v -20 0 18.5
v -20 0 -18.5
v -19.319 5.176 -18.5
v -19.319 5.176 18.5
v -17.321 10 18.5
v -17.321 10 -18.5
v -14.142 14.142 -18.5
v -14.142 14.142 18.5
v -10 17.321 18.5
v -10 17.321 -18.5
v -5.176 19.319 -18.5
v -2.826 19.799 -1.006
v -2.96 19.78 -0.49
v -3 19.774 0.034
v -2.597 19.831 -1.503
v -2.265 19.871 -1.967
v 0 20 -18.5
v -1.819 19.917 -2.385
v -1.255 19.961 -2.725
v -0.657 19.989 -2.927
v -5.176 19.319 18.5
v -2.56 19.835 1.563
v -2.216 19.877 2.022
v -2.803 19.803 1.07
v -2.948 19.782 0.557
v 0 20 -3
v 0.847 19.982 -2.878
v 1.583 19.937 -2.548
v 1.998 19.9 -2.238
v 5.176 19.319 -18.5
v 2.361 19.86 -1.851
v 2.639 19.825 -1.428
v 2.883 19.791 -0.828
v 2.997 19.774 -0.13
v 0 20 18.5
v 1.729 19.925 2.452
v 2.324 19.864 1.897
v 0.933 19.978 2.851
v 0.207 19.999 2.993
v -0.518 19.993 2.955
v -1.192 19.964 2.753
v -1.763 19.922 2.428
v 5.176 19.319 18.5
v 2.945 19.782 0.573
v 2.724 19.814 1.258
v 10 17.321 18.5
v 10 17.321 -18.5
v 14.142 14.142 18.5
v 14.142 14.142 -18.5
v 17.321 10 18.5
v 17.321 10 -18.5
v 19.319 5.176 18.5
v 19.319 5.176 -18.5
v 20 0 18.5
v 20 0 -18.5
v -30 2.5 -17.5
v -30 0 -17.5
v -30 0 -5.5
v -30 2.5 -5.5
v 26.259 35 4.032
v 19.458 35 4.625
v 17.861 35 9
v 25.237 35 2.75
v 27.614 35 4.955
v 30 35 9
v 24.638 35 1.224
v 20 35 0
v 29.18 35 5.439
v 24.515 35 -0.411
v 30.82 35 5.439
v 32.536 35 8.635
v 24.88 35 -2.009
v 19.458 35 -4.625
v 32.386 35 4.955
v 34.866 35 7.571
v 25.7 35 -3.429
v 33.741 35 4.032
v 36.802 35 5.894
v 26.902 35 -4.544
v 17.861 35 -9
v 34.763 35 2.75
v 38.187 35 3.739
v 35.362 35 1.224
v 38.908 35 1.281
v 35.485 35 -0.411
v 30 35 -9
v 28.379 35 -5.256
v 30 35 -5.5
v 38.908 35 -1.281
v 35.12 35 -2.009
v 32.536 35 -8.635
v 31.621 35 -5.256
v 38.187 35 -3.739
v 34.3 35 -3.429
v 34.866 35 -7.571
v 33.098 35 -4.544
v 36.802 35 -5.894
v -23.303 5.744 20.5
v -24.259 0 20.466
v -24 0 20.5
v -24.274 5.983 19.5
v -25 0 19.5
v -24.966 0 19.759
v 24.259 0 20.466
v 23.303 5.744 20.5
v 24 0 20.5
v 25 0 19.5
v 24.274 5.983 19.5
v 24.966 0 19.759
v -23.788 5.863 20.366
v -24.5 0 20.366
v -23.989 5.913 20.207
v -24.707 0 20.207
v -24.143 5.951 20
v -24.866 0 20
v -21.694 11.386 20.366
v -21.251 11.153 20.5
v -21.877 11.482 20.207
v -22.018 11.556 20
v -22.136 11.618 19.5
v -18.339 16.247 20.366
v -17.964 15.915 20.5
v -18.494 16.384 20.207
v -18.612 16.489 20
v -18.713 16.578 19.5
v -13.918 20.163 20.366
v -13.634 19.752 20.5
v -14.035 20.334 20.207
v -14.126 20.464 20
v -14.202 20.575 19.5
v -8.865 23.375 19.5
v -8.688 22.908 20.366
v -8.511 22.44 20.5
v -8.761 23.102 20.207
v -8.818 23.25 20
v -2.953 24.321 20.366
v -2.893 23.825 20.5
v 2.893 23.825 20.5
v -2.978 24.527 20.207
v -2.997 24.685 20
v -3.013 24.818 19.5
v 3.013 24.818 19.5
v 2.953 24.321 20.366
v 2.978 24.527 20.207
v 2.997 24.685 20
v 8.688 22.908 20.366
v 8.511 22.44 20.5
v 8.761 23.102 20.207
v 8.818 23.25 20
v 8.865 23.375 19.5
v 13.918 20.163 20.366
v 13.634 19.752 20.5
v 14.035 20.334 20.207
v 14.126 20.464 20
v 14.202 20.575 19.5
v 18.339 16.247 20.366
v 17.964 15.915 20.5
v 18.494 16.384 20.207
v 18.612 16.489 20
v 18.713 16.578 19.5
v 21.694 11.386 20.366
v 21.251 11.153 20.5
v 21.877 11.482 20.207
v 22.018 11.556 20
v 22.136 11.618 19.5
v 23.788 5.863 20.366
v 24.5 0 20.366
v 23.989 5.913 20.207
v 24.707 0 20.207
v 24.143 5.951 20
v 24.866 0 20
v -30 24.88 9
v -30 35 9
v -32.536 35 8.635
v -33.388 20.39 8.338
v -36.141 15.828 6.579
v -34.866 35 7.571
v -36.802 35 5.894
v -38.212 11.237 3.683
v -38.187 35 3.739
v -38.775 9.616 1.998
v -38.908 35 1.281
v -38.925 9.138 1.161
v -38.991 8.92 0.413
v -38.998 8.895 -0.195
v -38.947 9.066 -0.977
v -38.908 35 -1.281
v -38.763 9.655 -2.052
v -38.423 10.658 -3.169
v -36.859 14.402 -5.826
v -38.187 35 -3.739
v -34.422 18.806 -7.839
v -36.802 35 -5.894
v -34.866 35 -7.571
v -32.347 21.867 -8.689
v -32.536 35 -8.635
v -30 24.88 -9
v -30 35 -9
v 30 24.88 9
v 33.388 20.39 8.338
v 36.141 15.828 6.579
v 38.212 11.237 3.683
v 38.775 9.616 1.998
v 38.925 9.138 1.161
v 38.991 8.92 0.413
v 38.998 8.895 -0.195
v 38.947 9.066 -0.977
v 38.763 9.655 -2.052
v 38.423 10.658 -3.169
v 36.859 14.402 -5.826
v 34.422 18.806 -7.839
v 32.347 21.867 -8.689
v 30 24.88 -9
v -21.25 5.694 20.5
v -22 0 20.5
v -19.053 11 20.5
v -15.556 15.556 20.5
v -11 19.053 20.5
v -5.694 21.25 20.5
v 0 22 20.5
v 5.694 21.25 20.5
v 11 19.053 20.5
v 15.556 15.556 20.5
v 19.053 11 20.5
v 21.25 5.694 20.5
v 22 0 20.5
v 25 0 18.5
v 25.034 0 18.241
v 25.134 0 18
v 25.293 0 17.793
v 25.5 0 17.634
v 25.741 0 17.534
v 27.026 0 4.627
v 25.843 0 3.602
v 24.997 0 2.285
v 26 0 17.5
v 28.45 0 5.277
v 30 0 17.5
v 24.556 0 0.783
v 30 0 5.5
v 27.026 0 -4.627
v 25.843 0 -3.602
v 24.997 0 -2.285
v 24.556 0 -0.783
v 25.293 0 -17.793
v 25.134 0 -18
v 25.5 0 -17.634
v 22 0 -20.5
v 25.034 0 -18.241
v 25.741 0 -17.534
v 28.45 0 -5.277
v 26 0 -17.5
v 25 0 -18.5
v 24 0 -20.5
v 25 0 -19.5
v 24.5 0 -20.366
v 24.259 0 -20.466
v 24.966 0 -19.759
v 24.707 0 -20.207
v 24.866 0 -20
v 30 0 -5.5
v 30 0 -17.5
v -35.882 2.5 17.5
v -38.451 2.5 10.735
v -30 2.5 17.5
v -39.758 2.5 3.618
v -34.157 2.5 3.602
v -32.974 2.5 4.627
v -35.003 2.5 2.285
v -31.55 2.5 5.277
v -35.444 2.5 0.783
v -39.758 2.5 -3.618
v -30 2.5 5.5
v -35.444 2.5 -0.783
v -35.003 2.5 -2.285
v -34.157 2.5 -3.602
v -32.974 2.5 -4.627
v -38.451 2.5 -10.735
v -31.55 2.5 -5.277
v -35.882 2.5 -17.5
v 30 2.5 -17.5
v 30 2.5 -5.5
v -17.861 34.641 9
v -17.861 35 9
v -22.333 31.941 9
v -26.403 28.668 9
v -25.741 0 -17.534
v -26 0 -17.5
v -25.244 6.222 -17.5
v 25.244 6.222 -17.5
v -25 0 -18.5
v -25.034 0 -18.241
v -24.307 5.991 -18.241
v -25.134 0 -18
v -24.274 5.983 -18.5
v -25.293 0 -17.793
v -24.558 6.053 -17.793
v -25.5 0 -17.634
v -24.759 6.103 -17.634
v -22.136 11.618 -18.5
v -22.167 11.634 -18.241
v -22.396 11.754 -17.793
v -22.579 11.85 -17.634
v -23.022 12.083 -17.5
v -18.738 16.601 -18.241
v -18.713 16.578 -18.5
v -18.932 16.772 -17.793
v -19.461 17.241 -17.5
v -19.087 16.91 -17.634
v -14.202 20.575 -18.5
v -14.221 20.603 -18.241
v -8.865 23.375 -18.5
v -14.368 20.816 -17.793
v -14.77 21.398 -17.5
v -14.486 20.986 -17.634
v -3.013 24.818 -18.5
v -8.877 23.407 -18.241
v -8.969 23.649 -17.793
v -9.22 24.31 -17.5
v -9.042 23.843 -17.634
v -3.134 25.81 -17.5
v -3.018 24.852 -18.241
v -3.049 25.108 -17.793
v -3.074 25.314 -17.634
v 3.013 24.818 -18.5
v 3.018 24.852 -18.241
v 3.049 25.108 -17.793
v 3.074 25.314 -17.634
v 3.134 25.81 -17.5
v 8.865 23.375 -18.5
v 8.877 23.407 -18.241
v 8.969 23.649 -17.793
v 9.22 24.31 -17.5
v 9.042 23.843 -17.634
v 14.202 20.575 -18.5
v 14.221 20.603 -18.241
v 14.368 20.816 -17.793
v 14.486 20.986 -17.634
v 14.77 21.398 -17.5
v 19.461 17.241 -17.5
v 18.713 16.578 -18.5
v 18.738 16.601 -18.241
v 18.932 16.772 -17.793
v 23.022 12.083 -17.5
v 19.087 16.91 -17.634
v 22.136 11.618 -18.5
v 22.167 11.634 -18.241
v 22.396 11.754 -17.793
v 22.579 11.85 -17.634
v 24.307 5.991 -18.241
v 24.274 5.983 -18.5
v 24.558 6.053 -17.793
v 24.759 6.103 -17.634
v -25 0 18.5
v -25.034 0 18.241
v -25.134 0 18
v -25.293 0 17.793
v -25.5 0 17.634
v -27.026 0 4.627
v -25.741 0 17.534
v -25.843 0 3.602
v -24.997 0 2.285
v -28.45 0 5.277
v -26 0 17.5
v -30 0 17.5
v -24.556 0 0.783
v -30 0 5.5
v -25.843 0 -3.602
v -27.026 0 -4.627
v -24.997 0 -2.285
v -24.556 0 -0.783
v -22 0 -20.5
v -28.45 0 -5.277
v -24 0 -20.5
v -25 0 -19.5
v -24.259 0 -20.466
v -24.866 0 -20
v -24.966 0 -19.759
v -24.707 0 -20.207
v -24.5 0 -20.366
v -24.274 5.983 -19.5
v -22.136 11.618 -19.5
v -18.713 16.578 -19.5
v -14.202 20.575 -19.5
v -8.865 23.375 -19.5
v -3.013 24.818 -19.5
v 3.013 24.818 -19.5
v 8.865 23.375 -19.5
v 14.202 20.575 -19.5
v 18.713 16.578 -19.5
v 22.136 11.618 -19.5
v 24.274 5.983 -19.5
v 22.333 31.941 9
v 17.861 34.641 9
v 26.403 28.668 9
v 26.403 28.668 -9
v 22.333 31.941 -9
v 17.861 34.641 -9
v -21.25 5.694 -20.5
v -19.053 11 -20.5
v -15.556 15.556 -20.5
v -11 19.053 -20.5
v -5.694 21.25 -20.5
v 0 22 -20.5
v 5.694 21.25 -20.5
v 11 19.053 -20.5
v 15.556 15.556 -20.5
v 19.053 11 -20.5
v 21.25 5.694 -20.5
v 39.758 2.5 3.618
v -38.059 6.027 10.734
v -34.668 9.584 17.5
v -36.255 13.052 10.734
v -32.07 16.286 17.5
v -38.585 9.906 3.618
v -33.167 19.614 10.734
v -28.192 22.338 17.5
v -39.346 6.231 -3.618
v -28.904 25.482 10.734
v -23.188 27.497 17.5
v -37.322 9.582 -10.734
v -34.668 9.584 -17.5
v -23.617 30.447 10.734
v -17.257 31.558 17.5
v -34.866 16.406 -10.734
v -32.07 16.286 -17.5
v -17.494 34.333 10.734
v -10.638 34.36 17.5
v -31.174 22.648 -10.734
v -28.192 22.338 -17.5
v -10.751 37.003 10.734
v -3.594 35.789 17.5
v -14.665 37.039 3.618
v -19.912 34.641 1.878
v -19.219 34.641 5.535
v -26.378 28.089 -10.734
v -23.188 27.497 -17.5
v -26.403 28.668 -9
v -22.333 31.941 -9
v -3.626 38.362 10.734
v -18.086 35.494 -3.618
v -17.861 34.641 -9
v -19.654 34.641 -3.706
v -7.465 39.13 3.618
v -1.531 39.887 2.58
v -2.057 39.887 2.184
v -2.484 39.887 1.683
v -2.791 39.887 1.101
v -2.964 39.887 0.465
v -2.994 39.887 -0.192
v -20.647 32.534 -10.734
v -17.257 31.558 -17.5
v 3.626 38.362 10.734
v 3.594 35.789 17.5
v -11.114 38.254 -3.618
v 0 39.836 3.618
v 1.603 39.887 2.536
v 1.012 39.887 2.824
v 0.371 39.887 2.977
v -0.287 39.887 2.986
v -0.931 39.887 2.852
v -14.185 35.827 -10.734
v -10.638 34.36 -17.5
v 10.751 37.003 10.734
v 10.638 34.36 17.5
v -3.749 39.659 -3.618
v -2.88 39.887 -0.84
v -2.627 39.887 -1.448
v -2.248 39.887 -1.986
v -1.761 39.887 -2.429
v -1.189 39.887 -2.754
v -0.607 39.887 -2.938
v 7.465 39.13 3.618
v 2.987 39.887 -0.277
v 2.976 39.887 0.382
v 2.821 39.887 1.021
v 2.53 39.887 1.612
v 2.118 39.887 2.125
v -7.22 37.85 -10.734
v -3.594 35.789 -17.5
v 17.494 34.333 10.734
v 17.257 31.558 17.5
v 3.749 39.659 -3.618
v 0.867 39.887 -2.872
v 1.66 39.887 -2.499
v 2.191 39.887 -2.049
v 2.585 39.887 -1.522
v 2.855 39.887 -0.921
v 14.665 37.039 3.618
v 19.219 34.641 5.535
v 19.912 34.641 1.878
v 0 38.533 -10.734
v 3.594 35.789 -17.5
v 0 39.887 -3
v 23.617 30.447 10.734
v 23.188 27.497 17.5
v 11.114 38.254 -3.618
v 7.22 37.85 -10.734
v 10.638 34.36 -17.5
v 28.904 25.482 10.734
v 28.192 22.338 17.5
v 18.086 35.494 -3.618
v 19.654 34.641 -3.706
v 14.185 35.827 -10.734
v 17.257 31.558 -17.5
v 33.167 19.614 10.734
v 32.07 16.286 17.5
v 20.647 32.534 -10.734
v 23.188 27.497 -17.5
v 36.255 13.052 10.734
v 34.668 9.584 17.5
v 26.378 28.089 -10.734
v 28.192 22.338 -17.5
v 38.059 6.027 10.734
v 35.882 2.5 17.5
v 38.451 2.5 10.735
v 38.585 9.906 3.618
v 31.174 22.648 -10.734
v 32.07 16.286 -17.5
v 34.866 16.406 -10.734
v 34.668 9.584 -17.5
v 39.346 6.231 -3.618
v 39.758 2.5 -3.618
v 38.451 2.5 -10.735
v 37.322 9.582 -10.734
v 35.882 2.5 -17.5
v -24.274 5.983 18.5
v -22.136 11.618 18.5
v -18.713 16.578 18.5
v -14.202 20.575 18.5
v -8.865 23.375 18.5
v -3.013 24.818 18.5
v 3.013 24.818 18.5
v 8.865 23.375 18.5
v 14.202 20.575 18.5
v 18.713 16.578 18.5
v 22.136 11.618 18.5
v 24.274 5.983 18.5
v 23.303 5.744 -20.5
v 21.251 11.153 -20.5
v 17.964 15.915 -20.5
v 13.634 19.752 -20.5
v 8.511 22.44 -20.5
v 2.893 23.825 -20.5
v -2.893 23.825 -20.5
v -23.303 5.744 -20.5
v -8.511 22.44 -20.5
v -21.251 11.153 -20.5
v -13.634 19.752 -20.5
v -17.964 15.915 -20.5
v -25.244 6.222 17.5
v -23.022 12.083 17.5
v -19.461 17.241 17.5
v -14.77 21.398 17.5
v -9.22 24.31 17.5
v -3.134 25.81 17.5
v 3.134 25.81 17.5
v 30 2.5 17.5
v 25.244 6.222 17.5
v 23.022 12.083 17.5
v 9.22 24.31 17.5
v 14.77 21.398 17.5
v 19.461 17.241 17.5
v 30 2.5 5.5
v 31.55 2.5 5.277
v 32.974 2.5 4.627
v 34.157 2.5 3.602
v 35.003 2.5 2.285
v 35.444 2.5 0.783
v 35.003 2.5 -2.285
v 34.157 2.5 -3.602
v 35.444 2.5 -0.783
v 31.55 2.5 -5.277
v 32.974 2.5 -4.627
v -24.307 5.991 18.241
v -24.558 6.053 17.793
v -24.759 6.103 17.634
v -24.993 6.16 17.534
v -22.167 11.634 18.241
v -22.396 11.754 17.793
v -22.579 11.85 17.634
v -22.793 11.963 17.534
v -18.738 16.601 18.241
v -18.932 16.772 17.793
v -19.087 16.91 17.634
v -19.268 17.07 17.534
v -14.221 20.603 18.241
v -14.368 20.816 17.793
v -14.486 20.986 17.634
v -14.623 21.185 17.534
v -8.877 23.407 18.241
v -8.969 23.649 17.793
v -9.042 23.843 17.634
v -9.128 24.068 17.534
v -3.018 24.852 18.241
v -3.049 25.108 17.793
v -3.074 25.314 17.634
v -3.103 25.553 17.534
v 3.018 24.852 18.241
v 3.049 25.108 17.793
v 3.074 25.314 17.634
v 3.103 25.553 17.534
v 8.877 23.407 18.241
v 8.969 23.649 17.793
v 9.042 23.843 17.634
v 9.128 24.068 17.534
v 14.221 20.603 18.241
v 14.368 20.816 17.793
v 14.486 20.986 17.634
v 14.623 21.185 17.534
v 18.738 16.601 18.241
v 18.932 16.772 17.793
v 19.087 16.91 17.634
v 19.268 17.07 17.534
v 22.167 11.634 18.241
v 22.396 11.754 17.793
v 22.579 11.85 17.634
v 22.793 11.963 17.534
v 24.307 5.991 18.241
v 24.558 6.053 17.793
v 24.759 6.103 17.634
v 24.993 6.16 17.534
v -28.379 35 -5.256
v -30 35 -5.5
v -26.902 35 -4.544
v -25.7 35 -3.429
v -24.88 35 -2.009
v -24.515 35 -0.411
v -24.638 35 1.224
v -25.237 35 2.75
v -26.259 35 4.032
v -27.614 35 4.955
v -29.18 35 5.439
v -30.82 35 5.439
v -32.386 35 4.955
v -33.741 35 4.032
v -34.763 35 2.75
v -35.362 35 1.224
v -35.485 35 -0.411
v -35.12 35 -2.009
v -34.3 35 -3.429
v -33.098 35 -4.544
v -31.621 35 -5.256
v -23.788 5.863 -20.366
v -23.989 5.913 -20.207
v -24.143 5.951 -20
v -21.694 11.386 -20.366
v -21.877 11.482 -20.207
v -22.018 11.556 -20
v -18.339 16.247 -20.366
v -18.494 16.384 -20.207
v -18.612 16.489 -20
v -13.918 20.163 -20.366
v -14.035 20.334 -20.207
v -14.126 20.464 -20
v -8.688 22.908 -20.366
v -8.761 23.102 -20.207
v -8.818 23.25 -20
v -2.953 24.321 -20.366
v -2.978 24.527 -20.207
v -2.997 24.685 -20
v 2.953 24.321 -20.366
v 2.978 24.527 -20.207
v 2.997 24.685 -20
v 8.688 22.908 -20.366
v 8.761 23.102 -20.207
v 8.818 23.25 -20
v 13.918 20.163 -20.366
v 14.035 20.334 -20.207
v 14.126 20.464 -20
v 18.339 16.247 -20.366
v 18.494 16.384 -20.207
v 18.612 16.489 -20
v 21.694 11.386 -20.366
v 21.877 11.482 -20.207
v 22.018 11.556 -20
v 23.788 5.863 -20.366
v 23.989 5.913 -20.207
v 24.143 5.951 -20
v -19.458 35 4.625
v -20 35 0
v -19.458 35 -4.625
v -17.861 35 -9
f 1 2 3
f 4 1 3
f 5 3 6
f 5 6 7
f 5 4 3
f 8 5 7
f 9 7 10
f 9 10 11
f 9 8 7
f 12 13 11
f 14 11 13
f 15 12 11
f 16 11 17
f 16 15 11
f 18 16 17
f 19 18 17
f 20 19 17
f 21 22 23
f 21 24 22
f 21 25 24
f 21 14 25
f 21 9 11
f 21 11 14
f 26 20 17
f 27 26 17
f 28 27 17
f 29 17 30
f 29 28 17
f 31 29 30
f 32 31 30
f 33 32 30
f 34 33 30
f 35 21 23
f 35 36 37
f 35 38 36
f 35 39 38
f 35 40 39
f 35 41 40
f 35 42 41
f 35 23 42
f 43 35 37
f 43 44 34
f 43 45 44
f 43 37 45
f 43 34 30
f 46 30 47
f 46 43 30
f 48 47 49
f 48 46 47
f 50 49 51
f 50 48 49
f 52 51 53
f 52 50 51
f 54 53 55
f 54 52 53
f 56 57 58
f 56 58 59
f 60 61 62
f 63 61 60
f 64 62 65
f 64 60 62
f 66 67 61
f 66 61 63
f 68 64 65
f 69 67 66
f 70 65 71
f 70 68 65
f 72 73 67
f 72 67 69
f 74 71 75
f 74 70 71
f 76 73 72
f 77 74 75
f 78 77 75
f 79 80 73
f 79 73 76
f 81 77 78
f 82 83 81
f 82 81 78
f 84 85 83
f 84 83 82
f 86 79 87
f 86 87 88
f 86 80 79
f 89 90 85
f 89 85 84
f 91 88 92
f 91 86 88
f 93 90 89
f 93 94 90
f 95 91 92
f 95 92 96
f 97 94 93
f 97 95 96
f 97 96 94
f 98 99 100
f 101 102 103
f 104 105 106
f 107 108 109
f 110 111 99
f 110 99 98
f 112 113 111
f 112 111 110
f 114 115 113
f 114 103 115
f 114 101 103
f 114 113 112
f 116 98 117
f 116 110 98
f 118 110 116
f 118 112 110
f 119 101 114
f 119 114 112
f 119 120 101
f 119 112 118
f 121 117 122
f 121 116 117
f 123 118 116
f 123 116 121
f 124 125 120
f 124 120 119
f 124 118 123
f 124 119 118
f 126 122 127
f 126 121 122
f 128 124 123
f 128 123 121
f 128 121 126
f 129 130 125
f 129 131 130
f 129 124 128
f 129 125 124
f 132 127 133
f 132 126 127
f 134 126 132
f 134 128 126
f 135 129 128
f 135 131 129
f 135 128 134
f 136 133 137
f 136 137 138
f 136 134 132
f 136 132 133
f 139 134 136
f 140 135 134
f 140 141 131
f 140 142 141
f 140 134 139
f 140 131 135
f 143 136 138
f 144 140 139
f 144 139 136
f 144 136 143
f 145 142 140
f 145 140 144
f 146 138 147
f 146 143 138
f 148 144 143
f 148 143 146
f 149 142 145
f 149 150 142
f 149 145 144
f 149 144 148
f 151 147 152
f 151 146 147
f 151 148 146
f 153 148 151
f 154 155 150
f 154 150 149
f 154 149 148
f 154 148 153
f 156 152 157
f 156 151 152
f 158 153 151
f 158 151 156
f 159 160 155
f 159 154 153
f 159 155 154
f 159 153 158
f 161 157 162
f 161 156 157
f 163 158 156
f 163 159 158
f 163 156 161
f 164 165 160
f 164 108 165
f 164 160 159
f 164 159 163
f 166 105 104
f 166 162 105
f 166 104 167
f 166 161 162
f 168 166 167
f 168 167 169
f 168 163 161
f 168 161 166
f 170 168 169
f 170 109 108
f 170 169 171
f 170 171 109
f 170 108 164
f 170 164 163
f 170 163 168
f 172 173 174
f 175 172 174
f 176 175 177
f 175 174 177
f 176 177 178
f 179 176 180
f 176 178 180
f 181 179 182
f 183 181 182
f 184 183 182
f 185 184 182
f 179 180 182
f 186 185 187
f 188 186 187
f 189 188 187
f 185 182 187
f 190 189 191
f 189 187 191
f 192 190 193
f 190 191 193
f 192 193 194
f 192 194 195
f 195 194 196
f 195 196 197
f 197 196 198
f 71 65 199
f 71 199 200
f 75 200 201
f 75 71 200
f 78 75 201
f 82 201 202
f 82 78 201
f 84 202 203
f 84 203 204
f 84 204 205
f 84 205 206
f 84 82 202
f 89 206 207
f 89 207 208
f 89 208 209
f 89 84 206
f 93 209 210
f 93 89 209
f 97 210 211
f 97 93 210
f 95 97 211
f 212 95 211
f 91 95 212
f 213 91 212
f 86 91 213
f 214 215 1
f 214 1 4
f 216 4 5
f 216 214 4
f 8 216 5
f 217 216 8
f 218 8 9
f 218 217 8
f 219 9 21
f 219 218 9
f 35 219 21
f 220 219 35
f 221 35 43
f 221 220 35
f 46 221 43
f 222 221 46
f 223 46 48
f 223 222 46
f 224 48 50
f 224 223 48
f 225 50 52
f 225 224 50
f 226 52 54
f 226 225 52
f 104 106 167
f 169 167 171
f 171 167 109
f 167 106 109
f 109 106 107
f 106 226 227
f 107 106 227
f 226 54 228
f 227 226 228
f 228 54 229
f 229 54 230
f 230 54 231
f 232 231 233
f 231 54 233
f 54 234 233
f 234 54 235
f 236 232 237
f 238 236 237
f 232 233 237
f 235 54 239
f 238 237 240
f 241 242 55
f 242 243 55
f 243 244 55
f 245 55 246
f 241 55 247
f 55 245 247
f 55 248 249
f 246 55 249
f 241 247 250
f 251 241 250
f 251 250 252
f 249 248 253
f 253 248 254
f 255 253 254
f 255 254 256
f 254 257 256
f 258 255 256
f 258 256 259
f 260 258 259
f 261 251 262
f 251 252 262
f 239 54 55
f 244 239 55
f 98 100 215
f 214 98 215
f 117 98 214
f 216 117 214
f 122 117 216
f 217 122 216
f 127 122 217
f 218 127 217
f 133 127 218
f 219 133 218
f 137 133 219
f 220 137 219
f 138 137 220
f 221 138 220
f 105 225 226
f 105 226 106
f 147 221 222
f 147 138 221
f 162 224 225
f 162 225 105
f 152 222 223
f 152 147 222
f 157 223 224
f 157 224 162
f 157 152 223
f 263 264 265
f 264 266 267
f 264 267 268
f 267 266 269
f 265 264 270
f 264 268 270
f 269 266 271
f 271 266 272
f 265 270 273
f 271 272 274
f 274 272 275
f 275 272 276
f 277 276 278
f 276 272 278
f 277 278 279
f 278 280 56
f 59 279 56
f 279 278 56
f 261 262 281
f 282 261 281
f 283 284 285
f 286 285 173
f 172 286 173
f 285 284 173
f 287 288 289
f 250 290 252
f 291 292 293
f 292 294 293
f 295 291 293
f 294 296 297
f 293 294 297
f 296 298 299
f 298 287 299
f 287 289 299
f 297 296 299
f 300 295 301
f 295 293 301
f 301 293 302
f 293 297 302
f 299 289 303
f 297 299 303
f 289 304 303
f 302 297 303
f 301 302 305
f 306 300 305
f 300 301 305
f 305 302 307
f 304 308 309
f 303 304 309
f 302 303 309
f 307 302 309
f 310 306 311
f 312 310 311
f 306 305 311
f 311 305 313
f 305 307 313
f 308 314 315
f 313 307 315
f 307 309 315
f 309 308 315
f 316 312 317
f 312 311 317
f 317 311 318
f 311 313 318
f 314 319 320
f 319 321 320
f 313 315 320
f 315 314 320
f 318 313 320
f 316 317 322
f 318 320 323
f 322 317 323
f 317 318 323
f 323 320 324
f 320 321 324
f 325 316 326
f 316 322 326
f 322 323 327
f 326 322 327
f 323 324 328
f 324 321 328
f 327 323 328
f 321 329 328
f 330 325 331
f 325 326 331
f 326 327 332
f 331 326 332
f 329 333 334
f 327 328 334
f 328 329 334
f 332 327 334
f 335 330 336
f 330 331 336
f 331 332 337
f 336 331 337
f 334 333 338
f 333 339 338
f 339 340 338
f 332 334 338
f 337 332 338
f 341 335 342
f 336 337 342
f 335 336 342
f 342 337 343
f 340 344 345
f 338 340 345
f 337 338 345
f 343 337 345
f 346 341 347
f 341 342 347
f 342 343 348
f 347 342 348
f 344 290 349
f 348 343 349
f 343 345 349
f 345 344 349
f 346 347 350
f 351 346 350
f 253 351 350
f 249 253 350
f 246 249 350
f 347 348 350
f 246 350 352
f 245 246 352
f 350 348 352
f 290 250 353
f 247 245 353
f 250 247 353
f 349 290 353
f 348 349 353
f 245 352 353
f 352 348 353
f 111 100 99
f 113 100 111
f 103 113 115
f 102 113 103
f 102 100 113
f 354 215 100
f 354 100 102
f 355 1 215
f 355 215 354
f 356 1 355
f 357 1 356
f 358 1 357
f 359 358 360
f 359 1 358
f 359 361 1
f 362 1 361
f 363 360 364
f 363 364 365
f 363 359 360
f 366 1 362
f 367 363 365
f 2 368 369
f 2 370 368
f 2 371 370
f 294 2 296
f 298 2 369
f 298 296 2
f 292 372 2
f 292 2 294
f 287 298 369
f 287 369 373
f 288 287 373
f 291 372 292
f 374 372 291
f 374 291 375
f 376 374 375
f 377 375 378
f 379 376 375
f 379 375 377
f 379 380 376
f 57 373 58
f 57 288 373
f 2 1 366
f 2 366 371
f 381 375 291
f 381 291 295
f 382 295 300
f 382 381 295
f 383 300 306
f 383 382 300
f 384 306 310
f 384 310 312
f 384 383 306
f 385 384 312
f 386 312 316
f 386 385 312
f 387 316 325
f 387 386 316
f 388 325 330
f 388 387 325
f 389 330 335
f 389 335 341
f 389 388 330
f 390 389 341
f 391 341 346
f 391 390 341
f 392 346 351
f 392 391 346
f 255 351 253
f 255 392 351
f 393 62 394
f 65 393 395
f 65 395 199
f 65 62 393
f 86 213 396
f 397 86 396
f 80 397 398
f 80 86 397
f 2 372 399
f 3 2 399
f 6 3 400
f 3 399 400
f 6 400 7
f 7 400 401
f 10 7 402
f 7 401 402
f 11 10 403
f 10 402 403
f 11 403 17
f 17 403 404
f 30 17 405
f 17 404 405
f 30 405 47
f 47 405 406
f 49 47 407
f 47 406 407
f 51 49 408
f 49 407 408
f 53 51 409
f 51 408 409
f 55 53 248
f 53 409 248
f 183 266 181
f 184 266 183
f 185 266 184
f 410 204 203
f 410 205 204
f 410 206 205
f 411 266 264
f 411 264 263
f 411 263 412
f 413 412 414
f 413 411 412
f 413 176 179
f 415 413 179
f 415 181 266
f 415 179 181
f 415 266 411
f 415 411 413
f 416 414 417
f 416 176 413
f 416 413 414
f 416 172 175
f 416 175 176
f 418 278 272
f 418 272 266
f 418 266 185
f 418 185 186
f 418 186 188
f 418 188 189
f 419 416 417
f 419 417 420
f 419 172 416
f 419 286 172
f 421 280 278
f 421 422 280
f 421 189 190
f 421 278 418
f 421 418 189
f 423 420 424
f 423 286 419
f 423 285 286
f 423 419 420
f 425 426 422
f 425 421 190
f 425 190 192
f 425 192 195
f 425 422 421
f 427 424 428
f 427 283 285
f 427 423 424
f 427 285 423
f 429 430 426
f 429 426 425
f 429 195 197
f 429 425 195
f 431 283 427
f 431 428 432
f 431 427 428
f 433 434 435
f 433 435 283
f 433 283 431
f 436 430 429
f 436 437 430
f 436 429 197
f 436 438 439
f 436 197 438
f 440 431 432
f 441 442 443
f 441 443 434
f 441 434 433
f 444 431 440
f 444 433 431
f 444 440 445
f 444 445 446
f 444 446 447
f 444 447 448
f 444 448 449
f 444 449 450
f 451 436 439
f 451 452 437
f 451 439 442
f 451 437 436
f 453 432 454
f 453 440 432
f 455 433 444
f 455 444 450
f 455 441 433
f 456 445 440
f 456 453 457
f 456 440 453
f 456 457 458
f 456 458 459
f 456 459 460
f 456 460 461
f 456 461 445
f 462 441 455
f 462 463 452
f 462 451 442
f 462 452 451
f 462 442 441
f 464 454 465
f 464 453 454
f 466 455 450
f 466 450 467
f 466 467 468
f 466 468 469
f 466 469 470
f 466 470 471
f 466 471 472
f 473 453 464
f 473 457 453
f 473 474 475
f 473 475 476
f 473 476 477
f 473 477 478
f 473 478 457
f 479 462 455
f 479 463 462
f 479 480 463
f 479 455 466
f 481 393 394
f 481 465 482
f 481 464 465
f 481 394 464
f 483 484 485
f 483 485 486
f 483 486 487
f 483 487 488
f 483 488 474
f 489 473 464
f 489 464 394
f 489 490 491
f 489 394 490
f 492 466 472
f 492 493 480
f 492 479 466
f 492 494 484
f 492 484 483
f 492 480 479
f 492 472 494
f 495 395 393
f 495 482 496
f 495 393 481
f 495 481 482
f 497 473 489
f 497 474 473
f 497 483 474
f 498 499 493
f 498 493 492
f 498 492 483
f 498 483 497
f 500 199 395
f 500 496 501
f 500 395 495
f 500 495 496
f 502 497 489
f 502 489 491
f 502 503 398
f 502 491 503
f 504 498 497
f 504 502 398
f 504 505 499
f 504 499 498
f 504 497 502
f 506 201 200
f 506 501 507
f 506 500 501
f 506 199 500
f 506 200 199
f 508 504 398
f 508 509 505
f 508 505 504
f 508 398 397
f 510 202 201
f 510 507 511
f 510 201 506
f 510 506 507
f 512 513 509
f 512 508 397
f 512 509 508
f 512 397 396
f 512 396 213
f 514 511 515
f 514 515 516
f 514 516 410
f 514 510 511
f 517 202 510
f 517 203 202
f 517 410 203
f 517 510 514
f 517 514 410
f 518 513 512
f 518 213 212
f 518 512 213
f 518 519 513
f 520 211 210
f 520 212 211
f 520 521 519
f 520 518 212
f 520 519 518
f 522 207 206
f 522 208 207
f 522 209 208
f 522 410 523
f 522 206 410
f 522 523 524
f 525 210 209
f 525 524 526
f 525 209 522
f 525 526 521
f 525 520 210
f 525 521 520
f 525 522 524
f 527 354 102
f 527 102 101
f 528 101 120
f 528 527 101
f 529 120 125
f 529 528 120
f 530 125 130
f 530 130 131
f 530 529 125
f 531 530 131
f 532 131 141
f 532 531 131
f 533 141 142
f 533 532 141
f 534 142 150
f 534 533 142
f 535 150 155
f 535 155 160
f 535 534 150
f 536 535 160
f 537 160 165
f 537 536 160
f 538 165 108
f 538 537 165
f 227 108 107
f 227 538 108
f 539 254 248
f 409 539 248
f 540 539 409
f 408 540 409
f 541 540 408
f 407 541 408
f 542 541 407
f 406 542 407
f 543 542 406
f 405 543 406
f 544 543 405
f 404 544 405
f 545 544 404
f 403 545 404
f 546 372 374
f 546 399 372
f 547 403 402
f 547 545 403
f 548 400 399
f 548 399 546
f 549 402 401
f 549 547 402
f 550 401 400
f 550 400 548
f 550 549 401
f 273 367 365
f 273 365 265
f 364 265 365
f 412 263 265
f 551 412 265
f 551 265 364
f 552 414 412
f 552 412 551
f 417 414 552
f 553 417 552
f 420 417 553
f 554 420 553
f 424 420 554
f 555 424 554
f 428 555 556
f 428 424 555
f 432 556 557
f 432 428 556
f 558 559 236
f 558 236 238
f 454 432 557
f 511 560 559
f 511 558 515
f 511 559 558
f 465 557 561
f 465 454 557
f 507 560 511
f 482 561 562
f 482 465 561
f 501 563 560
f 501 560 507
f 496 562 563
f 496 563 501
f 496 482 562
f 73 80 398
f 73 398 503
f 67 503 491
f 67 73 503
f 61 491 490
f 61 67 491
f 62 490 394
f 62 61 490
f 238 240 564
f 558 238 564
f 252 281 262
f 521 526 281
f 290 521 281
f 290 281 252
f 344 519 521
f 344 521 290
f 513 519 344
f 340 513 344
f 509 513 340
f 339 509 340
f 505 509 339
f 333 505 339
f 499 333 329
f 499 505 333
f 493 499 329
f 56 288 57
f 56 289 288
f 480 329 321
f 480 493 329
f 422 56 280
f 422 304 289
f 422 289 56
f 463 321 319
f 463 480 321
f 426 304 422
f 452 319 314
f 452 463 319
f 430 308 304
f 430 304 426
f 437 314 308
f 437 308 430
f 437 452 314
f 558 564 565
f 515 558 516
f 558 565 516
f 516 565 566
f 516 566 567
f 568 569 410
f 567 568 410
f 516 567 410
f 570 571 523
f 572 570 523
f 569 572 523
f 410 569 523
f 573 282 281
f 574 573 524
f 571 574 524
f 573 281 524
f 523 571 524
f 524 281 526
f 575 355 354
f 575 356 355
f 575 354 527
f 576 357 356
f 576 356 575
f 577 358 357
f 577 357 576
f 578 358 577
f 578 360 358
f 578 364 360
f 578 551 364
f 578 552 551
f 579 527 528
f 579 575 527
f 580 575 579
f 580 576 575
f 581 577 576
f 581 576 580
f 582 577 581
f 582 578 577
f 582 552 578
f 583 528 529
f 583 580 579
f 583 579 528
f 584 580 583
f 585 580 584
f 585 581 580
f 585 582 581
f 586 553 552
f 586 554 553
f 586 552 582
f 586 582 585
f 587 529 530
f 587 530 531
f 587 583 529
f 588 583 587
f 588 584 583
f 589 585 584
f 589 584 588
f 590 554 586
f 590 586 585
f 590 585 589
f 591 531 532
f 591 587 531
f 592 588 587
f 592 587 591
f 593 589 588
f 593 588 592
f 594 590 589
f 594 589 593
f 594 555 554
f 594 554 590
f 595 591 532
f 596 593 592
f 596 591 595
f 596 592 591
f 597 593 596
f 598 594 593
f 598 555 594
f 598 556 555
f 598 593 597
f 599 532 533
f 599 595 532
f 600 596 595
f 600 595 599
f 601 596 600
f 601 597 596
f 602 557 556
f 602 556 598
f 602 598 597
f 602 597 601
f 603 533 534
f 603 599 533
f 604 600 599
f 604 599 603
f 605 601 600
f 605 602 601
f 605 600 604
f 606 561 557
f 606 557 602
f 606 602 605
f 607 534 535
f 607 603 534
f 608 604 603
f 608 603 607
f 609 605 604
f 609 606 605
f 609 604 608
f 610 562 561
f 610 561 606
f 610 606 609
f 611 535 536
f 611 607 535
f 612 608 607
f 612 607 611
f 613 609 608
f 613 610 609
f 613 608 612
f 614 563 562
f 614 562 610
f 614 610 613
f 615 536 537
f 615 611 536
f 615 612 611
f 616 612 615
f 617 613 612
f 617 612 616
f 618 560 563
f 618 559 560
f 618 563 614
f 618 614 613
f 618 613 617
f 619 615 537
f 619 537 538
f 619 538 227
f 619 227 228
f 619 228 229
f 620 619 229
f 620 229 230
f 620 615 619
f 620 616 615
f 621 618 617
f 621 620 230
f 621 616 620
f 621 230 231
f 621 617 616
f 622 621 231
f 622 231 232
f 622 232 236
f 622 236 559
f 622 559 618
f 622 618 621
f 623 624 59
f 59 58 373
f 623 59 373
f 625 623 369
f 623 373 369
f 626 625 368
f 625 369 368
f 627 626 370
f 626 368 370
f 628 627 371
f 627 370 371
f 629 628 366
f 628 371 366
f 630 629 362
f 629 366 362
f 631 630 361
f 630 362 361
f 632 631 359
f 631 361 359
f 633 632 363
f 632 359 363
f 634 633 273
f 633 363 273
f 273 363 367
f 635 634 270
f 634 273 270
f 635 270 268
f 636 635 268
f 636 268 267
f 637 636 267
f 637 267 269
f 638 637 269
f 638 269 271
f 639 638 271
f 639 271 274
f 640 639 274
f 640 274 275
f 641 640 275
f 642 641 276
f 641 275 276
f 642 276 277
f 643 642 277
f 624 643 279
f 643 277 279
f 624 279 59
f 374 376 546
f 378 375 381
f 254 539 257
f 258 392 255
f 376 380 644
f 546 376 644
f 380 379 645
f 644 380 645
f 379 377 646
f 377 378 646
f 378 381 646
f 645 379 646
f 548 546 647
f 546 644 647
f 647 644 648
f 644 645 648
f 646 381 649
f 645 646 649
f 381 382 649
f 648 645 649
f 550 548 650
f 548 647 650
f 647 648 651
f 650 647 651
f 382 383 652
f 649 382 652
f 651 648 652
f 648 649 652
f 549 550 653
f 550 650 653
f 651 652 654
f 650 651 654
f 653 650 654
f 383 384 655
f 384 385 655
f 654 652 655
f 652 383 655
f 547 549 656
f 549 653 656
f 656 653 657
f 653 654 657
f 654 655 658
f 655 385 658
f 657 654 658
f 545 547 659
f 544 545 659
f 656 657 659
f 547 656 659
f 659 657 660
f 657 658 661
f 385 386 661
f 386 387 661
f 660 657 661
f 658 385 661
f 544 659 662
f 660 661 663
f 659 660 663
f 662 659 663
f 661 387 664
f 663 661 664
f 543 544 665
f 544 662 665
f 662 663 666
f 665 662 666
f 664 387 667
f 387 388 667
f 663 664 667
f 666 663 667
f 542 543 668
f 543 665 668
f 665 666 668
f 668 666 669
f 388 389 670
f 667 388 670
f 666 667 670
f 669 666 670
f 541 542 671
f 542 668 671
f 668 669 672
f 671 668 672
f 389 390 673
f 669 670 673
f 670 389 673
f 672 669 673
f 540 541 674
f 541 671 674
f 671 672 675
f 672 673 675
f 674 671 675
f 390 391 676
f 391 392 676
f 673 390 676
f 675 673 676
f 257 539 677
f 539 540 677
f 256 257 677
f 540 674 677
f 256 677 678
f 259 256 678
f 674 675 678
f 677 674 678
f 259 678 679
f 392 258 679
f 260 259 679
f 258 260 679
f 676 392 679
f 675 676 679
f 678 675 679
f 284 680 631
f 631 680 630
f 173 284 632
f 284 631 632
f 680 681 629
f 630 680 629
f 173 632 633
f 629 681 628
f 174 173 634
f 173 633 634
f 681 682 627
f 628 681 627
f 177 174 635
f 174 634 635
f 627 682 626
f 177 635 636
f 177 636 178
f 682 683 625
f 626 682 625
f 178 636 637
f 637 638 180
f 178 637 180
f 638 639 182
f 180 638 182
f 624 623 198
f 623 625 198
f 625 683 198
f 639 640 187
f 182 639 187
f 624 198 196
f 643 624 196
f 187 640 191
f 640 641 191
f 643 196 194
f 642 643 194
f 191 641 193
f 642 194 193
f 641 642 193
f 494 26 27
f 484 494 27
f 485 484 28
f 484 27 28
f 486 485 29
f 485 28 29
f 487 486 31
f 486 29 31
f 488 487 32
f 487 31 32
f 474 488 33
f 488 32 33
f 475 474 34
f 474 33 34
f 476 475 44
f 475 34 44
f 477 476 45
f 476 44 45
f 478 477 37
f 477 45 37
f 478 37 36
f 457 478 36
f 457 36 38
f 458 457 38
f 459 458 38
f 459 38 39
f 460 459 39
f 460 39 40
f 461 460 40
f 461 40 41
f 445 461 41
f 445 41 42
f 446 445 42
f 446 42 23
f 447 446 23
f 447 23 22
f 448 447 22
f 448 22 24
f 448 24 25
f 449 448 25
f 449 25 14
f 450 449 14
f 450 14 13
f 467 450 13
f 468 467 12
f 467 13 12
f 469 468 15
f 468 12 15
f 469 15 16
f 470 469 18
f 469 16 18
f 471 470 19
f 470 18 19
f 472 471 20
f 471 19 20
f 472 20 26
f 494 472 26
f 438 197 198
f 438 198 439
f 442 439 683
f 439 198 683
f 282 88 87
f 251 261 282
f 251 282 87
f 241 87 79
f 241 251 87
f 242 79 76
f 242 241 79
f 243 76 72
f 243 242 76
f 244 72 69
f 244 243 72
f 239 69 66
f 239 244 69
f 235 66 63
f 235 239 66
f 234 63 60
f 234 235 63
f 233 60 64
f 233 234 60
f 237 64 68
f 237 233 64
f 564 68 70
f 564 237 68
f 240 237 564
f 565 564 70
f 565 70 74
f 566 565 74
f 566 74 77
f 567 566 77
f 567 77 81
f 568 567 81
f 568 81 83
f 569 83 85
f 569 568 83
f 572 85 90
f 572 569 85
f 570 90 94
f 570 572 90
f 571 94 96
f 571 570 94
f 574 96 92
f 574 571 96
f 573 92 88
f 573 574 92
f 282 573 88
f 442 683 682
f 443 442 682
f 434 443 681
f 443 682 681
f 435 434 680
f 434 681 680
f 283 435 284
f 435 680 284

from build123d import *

# Parameters (mm, degrees)
REVOLVE1_ANGLE           = 180
BOSS_EXTRUDE1_REACH      = 58.967
BOSS_EXTRUDE1_END_RADIUS = 40
SKETCH3_R                = 5.5
CUT_EXTRUDE1_DEPTH       = 61.16851336
SKETCH4_R                = 3
CUT_EXTRUDE2_DEPTH       = 61.16851336
CUT_EXTRUDE3_DEPTH       = 61.093676973
CUT_EXTRUDE3_DEPTH_BACK  = 61.093676973
SKETCH5_W                = 18.19644254
SKETCH5_H                = 2.5
SKETCH5_W_2              = 19.029010645
CHAMFER1_SIZE            = 2
FILLET1_R                = 1


with BuildPart() as part:
    # Sketch1 → Revolve1 (revolve)
    with BuildSketch(Plane(origin=(0, 0, 0), x_dir=(1, 0, 0), z_dir=(0, 1, 0))):
        with BuildLine():
            Line((-20, 20.5), (-20, -20.5))
            Line((-20, -20.5), (-25, -20.5))
            Line((-25, -20.5), (-25, -17.5))
            Line((-25, -17.5), (-35.968736425, -17.5))
            ThreePointArc((-35.968736425, -17.5), (-40, 0), (-35.968736425, 17.5))
            Line((-35.968736425, 17.5), (-25, 17.5))
            Line((-25, 17.5), (-25, 20.5))
            Line((-25, 20.5), (-20, 20.5))
        make_face()
    revolve(axis=Axis((0, 0, 0), (0, 0, -1)), revolution_arc=REVOLVE1_ANGLE)

    # Boss-Extrude1: up to this sphere (the profile starts outside it)
    boss_extrude1_end = Location((0, 0, 0)) * Sphere(BOSS_EXTRUDE1_END_RADIUS, mode=Mode.PRIVATE)
    # Sketch2 → Boss-Extrude1 (add, up to the surface)
    with BuildSketch(Plane(origin=(0, 35, 0), x_dir=(-1, 0, 0), z_dir=(0, -1, 0)), mode=Mode.PRIVATE) as boss_extrude1_sk1:
        with BuildLine():
            Line((30, 9), (17.860571099, 9))
            ThreePointArc((17.860571099, 9), (20, 0), (17.860571099, -9))
            Line((17.860571099, -9), (30, -9))
            ThreePointArc((30, -9), (39, 0), (30, 9))
        make_face()
    boss_extrude1_tool1 = extrude(boss_extrude1_sk1.sketch, amount=BOSS_EXTRUDE1_REACH, mode=Mode.PRIVATE) - boss_extrude1_end
    boss_extrude1 = boss_extrude1_tool1.solids().sort_by_distance((-28.288022, 35, 0))[0]
    add(boss_extrude1)

    # Sketch3 → Cut-Extrude1 (cut, through all)
    with BuildSketch(Plane.XZ):
        with Locations(Location((-30, 0, 0), (0, 0, 270))):
            Circle(SKETCH3_R)
    cut_extrude1 = extrude(amount=-CUT_EXTRUDE1_DEPTH, mode=Mode.SUBTRACT)

    # Mirror1: Boss-Extrude1, Cut-Extrude1 across plane
    add(boss_extrude1.mirror(Plane(origin=(0, 0, 0), x_dir=(0, 0, 1), z_dir=(1, 0, 0))))
    add(cut_extrude1.mirror(Plane(origin=(0, 0, 0), x_dir=(0, 0, 1), z_dir=(1, 0, 0))), mode=Mode.SUBTRACT)

    # Sketch4 → Cut-Extrude2 (cut, through all)
    with BuildSketch(Plane.XZ):
        with Locations(Location((0, 0, 0), (0, 0, 270))):
            Circle(SKETCH4_R)
    extrude(amount=-CUT_EXTRUDE2_DEPTH, mode=Mode.SUBTRACT)

    # Sketch5 → Cut-Extrude3 (cut, two sides: drawn at the far end of the back side and taken through both)
    with BuildSketch(Plane.XY.offset(-CUT_EXTRUDE3_DEPTH_BACK)):
        with Locations((-39.09822127, 1.25)):
            Rectangle(SKETCH5_W, SKETCH5_H)
        with Locations((39.514505322, 1.25)):
            Rectangle(SKETCH5_W_2, SKETCH5_H)
    extrude(amount=CUT_EXTRUDE3_DEPTH + CUT_EXTRUDE3_DEPTH_BACK, mode=Mode.SUBTRACT)

    # Chamfer1
    chamfer1_edges = [part.edges().sort_by_distance(p)[0] for p in [
        (0, 20, -20.5),
        (0, 20, 20.5),
    ]]
    chamfer(chamfer1_edges, length=CHAMFER1_SIZE)

    # Fillet1
    fillet1_edges = [part.edges().sort_by_distance(p)[0] for p in [
        (0, 25, 20.5),
        (0, 25, 17.5),
        (0, 25, -17.5),
        (0, 25, -20.5),
    ]]
    fillet(fillet1_edges, radius=FILLET1_R)


solid = part.part
